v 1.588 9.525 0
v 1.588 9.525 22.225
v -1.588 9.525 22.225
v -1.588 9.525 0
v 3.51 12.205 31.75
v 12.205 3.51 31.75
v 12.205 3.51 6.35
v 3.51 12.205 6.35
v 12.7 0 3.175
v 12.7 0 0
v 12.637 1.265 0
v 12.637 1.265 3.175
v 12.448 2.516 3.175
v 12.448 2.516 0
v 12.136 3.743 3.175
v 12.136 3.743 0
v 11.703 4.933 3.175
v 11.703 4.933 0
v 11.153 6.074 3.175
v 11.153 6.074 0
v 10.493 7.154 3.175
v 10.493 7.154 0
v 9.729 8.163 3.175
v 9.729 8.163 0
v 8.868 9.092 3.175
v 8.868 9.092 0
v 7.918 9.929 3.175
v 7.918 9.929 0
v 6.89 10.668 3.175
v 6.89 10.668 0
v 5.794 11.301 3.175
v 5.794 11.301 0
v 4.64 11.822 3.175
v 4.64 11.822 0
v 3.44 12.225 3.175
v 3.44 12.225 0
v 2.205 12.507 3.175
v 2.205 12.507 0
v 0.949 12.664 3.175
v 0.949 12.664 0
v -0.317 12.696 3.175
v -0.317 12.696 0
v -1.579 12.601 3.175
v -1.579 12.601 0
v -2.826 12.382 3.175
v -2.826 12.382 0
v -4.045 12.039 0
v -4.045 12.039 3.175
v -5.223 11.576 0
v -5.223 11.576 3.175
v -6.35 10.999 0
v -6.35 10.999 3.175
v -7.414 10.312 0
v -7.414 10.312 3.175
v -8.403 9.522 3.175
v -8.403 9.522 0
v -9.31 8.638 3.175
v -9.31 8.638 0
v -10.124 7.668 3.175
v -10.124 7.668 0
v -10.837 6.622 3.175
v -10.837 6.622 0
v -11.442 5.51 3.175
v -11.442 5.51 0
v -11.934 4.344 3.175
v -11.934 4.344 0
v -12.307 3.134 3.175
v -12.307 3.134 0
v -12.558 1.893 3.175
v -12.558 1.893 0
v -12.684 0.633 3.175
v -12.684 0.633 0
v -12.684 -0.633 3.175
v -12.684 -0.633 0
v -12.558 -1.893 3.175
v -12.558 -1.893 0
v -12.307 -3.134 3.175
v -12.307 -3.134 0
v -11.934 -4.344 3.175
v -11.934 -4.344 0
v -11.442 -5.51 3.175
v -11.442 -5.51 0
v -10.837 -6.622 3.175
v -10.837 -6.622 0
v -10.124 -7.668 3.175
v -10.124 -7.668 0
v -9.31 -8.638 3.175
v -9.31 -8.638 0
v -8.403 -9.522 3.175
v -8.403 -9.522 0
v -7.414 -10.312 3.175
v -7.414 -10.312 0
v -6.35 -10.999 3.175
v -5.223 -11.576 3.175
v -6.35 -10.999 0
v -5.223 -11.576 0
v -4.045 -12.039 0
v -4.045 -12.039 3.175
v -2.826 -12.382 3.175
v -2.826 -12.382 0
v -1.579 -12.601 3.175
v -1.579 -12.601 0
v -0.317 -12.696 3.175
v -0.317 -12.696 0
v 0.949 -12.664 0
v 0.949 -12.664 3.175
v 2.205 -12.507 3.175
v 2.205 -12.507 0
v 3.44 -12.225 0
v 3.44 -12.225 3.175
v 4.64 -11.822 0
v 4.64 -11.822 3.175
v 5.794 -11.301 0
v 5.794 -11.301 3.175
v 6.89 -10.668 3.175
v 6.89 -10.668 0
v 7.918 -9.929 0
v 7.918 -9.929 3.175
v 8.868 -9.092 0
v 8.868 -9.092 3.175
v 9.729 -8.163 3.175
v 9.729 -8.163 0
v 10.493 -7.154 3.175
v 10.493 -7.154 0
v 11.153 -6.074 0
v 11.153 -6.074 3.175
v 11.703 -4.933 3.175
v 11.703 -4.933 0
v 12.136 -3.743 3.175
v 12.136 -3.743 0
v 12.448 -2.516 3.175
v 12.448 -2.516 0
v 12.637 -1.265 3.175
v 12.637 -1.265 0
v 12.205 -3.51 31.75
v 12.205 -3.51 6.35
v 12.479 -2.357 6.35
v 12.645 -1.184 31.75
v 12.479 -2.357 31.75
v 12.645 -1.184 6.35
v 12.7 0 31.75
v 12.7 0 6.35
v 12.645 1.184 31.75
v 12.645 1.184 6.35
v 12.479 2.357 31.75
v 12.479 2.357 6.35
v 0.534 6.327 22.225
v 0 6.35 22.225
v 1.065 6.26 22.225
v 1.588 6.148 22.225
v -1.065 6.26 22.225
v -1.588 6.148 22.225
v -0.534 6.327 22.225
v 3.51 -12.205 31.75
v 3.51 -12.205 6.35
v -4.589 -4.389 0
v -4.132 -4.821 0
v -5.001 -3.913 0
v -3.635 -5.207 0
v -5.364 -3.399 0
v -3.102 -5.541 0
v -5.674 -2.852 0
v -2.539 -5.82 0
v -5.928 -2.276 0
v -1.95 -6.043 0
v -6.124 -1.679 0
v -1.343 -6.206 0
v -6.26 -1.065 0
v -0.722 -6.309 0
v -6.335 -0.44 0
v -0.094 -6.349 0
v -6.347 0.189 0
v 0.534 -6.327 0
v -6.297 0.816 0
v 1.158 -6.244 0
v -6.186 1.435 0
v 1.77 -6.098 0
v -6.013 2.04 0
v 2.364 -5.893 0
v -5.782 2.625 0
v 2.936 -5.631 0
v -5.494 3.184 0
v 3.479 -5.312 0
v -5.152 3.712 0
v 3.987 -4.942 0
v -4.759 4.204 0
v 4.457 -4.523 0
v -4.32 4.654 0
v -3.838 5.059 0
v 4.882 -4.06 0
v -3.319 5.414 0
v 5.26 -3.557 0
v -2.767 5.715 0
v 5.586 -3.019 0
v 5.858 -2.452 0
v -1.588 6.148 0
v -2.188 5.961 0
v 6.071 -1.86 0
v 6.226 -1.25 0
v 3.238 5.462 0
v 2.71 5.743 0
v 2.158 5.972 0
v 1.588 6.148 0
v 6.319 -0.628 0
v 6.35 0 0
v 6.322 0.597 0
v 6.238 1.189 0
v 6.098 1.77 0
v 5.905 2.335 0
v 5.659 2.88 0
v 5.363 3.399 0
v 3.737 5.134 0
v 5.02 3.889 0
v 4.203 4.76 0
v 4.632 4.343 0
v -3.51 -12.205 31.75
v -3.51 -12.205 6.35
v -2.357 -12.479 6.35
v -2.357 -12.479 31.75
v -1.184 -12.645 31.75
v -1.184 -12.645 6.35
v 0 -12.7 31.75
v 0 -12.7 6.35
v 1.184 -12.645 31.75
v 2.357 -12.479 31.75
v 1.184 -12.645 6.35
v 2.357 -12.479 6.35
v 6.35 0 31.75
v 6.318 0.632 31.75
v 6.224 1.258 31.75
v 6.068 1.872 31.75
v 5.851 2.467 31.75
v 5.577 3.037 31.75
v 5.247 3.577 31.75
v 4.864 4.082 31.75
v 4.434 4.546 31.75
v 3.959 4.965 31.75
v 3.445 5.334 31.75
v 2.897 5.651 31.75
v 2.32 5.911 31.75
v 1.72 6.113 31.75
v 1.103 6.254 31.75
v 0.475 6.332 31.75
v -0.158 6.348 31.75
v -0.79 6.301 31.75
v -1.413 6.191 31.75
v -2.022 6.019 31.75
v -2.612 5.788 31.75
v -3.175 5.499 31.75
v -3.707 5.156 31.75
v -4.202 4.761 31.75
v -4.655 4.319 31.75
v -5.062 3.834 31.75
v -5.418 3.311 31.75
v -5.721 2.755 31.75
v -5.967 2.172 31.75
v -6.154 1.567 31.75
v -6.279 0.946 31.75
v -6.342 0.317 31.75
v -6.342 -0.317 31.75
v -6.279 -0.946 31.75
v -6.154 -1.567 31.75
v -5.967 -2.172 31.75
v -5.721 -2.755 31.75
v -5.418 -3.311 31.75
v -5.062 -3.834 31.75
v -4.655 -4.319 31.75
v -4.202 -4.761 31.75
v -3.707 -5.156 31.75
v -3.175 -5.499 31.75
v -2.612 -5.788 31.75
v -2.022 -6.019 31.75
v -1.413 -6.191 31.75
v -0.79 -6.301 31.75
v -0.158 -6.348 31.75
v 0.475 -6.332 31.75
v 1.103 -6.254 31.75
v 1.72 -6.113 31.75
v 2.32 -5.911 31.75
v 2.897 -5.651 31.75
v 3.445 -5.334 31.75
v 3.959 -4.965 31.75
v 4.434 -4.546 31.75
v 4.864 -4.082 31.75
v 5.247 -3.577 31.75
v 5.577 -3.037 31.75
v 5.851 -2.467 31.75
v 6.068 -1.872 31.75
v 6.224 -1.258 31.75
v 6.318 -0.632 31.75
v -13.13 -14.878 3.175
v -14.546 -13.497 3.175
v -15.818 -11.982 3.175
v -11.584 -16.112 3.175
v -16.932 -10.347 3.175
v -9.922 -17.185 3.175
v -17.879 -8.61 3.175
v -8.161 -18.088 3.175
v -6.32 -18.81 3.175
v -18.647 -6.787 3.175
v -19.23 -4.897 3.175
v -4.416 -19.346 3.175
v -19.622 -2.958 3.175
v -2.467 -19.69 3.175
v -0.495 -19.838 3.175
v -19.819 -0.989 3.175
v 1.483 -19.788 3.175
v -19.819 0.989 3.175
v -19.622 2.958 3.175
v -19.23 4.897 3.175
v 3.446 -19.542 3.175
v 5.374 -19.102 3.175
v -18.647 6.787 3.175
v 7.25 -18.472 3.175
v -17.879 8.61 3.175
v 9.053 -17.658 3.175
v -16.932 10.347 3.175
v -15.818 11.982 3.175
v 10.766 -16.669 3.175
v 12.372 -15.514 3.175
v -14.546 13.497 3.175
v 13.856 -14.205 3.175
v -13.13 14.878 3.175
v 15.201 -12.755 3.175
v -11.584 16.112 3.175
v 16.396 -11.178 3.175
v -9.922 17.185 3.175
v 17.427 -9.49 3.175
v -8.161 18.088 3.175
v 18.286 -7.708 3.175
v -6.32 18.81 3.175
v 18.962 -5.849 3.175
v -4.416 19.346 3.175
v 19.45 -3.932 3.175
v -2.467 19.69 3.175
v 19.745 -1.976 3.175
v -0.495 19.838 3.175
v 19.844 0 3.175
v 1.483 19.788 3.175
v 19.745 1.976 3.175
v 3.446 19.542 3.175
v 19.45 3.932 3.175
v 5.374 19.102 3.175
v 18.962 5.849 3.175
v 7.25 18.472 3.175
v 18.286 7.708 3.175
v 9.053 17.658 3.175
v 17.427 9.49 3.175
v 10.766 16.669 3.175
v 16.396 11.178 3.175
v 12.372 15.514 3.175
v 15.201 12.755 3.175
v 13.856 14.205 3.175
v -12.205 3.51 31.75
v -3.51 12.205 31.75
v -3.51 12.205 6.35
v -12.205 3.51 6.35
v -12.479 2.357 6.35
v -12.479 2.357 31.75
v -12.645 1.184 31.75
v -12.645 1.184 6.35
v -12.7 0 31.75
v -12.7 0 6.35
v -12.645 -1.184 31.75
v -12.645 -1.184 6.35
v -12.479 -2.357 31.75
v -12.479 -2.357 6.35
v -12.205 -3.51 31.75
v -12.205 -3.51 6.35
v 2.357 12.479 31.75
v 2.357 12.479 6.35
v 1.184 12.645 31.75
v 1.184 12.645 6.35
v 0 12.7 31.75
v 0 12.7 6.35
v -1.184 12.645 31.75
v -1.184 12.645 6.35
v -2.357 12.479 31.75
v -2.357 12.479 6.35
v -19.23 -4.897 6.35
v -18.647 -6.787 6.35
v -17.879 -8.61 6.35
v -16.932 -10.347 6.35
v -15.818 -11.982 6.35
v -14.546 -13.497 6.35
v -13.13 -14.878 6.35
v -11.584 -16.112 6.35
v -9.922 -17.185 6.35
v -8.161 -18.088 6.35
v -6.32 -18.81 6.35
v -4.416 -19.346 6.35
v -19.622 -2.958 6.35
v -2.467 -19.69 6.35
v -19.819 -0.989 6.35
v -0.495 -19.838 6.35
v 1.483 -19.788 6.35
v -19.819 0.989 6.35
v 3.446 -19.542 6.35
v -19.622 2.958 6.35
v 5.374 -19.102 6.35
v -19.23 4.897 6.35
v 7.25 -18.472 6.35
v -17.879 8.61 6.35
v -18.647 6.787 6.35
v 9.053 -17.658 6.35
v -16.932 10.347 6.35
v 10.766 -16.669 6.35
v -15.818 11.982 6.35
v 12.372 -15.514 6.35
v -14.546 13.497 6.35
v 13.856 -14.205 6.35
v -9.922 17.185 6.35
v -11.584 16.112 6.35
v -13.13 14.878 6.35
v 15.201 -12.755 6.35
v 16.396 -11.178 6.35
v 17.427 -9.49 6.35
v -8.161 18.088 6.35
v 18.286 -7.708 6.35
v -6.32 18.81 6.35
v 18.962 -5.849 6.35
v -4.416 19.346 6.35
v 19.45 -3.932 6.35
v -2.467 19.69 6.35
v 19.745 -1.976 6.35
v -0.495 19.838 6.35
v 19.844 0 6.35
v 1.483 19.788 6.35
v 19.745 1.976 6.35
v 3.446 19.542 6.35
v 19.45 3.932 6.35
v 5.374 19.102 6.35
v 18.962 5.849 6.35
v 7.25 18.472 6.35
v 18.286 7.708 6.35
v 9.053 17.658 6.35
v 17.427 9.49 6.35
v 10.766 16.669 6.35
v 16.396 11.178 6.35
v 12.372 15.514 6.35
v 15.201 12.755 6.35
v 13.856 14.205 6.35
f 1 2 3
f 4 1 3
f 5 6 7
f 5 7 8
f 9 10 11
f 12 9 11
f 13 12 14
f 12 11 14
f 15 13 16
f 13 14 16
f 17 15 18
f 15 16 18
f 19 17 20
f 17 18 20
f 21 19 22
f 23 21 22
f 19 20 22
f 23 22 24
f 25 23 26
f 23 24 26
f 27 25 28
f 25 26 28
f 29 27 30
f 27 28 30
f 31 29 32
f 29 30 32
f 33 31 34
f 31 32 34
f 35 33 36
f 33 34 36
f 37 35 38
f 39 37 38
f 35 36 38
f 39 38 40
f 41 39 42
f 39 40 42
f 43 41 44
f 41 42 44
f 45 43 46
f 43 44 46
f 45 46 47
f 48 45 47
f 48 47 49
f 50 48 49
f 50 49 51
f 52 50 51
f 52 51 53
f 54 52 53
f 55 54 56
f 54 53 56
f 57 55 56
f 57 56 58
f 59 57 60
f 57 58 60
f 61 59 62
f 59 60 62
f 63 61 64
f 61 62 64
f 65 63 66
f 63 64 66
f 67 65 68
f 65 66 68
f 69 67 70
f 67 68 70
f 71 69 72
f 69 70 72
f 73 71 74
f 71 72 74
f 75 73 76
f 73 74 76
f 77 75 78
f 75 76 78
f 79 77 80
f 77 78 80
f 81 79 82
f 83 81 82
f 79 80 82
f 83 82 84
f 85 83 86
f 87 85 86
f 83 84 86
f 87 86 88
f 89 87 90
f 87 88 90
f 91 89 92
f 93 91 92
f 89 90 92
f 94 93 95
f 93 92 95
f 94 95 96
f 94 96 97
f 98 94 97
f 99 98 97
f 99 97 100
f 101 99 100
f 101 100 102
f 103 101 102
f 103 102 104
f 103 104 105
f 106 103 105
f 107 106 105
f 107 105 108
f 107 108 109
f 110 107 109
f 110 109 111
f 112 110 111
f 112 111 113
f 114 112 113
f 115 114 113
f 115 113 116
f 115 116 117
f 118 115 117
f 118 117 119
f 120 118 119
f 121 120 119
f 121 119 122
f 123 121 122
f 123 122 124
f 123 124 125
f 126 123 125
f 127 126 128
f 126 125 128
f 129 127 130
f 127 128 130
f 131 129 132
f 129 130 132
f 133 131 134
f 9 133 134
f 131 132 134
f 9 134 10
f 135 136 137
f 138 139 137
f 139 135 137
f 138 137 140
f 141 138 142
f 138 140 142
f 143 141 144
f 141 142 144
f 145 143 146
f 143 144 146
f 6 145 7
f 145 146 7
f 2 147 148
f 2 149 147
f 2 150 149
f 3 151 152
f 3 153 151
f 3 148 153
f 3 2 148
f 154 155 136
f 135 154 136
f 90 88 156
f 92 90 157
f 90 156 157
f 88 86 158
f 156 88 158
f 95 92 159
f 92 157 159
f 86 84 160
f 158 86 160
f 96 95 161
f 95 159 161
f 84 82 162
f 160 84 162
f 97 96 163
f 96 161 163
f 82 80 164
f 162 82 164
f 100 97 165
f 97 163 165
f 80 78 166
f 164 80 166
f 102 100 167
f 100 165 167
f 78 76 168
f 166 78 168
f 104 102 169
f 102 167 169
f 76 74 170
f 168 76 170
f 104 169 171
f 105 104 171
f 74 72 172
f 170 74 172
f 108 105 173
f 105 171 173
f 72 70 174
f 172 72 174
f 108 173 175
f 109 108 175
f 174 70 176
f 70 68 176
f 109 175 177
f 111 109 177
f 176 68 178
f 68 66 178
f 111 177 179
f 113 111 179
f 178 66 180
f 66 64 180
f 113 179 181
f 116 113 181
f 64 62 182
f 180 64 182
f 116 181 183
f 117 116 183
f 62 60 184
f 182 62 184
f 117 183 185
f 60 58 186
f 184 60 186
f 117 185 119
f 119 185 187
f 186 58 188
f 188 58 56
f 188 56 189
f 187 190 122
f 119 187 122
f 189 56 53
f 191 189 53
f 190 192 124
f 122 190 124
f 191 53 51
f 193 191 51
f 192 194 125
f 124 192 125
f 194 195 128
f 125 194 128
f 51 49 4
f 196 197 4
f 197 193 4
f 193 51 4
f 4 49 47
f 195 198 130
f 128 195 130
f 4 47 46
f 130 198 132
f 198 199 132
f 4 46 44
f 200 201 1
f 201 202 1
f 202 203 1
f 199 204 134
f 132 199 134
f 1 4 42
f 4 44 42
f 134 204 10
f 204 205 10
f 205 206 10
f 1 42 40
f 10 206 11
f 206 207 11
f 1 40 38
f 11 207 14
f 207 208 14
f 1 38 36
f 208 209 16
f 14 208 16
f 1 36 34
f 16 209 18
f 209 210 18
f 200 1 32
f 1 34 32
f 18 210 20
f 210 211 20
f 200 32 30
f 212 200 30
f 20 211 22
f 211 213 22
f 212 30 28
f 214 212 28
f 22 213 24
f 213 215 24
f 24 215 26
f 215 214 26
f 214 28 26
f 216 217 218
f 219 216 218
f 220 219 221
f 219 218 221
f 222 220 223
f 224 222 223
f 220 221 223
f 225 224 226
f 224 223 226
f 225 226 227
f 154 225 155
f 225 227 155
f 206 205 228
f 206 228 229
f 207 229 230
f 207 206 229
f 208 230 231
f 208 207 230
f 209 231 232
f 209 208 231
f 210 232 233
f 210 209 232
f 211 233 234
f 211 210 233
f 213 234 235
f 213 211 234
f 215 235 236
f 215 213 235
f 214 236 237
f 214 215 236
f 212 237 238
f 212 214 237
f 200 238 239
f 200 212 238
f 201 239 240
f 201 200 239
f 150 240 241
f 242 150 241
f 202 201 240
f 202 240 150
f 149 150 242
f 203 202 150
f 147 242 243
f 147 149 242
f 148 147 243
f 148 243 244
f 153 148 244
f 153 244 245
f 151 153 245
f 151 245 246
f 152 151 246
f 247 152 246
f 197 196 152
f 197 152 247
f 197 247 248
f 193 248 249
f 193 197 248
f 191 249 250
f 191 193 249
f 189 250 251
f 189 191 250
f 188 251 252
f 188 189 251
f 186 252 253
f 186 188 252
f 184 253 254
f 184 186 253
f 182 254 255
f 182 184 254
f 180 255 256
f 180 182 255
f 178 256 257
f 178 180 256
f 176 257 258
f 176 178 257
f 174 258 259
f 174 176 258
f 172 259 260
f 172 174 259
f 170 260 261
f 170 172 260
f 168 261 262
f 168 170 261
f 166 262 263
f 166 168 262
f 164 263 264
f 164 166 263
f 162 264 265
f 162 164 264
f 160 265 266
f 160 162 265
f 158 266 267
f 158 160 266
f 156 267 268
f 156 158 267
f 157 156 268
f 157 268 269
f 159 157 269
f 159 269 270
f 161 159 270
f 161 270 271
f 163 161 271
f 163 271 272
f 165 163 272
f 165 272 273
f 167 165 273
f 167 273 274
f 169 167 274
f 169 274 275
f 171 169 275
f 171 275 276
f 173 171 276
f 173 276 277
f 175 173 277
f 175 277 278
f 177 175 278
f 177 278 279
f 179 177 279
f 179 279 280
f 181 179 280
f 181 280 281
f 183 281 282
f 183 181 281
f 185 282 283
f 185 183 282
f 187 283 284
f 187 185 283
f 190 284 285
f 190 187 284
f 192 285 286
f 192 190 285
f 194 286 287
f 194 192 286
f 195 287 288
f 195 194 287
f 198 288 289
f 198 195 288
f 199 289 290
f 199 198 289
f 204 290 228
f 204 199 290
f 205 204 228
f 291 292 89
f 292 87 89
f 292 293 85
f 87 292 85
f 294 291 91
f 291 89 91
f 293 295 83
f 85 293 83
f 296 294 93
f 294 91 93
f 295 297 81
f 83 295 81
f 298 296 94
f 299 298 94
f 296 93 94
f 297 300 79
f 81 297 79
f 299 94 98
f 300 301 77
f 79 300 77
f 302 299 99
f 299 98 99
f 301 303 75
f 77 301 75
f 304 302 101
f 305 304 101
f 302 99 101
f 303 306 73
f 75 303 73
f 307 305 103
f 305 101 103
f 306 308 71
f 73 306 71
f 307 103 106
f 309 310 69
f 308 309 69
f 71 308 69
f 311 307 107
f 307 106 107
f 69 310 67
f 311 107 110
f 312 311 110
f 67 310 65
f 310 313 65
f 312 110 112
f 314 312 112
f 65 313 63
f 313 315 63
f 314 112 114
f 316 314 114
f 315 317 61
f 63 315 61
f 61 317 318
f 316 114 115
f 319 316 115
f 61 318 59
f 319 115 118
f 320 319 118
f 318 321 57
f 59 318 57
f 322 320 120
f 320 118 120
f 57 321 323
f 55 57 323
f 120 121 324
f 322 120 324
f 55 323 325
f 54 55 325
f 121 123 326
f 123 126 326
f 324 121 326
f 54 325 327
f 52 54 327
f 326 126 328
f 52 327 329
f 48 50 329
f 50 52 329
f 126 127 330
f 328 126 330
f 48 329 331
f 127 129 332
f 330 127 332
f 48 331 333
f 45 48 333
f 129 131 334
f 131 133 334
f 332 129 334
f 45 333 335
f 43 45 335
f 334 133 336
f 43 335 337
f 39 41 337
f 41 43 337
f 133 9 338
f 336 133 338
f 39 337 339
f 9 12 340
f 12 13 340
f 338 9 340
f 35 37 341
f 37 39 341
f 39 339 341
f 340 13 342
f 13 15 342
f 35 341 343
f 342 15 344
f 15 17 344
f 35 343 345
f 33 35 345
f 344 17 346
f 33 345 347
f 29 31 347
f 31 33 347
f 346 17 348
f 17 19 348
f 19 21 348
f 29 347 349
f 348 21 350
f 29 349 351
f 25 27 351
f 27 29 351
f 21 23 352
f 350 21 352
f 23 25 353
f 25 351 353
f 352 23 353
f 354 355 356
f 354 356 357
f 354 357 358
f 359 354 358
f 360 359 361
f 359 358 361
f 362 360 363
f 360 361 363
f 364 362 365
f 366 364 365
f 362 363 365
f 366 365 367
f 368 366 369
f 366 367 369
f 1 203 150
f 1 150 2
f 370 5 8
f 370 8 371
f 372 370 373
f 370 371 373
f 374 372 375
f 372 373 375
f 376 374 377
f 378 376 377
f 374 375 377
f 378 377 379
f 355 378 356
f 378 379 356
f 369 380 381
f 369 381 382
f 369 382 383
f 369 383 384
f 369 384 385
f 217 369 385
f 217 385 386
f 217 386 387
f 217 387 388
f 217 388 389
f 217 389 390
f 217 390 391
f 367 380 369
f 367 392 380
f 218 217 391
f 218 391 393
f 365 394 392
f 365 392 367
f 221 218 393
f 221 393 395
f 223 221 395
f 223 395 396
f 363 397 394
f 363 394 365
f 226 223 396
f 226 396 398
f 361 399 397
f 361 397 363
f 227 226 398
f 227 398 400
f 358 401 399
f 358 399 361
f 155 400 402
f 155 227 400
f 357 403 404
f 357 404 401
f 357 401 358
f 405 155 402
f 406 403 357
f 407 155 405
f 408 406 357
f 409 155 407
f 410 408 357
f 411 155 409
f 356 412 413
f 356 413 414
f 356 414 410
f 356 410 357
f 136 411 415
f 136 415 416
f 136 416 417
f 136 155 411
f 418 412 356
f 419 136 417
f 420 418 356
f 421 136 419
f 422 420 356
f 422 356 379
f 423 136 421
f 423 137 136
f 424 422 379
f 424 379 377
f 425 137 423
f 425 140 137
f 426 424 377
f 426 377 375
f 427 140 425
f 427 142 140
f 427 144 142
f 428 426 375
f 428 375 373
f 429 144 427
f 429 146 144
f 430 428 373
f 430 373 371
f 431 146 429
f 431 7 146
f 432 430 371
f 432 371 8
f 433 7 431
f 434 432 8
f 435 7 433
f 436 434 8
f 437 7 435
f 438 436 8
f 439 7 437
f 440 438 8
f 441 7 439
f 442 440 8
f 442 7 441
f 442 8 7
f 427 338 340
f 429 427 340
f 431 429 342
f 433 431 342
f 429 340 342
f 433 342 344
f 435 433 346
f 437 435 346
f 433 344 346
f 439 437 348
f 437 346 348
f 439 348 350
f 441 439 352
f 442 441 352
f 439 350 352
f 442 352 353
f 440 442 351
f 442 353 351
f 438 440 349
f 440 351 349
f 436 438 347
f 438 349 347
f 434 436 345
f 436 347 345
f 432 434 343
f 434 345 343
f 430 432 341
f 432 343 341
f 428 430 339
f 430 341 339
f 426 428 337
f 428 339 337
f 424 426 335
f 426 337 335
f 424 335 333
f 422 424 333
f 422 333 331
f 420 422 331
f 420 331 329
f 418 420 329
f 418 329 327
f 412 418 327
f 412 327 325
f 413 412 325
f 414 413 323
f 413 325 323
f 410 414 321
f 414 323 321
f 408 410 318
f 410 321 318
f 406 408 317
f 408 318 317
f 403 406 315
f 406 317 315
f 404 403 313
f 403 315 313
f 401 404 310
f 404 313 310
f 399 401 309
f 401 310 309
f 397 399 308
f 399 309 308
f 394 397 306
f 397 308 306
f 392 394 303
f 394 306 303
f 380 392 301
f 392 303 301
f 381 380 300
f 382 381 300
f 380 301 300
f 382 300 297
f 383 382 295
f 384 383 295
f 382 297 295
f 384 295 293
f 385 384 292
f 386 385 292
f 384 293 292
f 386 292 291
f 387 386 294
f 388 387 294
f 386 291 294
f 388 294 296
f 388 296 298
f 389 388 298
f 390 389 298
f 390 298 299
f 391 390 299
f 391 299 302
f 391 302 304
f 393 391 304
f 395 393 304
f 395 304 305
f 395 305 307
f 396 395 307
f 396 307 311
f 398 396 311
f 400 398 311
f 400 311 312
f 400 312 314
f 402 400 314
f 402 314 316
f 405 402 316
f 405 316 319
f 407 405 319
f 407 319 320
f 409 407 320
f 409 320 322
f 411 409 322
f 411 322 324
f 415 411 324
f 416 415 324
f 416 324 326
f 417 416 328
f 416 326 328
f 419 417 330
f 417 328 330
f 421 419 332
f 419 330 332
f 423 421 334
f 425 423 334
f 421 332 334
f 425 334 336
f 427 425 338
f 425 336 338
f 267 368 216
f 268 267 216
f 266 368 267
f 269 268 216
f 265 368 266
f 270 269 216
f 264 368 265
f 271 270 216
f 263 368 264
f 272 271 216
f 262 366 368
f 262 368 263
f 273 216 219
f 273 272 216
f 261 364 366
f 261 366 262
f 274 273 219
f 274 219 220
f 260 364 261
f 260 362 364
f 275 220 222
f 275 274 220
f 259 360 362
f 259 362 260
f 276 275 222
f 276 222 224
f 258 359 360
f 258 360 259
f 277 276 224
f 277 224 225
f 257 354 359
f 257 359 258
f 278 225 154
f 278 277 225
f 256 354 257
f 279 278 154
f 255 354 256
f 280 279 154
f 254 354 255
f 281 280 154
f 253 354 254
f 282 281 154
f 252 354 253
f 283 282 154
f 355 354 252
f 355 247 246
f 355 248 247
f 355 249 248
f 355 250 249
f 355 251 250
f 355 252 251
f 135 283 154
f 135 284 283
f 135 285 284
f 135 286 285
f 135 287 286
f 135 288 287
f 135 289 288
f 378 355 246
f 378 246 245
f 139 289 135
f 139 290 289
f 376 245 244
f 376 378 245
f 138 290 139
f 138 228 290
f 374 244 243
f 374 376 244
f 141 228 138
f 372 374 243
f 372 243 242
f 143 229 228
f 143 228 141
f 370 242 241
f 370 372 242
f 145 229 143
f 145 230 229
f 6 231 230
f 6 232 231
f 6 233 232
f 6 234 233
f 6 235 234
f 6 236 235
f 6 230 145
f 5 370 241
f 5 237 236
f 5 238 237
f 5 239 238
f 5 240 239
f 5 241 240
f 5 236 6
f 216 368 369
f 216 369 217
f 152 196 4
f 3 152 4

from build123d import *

# Parameters (mm, degrees)
SKETCH1_R           = 12.7
SKETCH1_R_2         = 6.35
BOSS_EXTRUDE1_DEPTH = 3.175
SKETCH2_R           = 19.84375
SKETCH2_R_2         = 6.35
BOSS_EXTRUDE2_DEPTH = 3.175
SKETCH3_R           = 12.7
SKETCH3_R_2         = 6.35
BOSS_EXTRUDE3_DEPTH = 25.4
SKETCH4_W           = 3.175
SKETCH4_H           = 9.525
CUT_EXTRUDE1_DEPTH  = 22.225
SKETCH5_R           = 23.837000359
CUT_EXTRUDE2_DEPTH  = 25.4


with BuildPart() as part:
    # Sketch1 → Boss-Extrude1 (new body)
    with BuildSketch(Plane.XY):
        Circle(SKETCH1_R)
        Circle(SKETCH1_R_2, mode=Mode.SUBTRACT)
    extrude(amount=BOSS_EXTRUDE1_DEPTH)

    # Sketch2 → Boss-Extrude2 (add)
    with BuildSketch(Plane.XY.offset(3.175)):
        Circle(SKETCH2_R)
        Circle(SKETCH2_R_2, mode=Mode.SUBTRACT)
    extrude(amount=BOSS_EXTRUDE2_DEPTH)

    # Sketch3 → Boss-Extrude3 (add)
    with BuildSketch(Plane.XY.offset(6.35)):
        Circle(SKETCH3_R)
        Circle(SKETCH3_R_2, mode=Mode.SUBTRACT)
    extrude(amount=BOSS_EXTRUDE3_DEPTH)

    # Sketch4 → Cut-Extrude1 (cut)
    with BuildSketch(Plane(origin=(0, 0, 0), x_dir=(-1, 0, 0), z_dir=(0, 0, -1))):
        with Locations((0, 4.7625)):
            Rectangle(SKETCH4_W, SKETCH4_H)
    extrude(amount=-CUT_EXTRUDE1_DEPTH, mode=Mode.SUBTRACT)

    # Sketch5 → Cut-Extrude2 (cut)
    with BuildSketch(Plane.XY.offset(31.75)):
        Circle(SKETCH5_R)
        Polygon((0, 15.715448212), (-15.715448212, 0), (0, -15.715448212), (15.715448212, 0), align=None, mode=Mode.SUBTRACT)
    extrude(amount=-CUT_EXTRUDE2_DEPTH, mode=Mode.SUBTRACT)


solid = part.part
